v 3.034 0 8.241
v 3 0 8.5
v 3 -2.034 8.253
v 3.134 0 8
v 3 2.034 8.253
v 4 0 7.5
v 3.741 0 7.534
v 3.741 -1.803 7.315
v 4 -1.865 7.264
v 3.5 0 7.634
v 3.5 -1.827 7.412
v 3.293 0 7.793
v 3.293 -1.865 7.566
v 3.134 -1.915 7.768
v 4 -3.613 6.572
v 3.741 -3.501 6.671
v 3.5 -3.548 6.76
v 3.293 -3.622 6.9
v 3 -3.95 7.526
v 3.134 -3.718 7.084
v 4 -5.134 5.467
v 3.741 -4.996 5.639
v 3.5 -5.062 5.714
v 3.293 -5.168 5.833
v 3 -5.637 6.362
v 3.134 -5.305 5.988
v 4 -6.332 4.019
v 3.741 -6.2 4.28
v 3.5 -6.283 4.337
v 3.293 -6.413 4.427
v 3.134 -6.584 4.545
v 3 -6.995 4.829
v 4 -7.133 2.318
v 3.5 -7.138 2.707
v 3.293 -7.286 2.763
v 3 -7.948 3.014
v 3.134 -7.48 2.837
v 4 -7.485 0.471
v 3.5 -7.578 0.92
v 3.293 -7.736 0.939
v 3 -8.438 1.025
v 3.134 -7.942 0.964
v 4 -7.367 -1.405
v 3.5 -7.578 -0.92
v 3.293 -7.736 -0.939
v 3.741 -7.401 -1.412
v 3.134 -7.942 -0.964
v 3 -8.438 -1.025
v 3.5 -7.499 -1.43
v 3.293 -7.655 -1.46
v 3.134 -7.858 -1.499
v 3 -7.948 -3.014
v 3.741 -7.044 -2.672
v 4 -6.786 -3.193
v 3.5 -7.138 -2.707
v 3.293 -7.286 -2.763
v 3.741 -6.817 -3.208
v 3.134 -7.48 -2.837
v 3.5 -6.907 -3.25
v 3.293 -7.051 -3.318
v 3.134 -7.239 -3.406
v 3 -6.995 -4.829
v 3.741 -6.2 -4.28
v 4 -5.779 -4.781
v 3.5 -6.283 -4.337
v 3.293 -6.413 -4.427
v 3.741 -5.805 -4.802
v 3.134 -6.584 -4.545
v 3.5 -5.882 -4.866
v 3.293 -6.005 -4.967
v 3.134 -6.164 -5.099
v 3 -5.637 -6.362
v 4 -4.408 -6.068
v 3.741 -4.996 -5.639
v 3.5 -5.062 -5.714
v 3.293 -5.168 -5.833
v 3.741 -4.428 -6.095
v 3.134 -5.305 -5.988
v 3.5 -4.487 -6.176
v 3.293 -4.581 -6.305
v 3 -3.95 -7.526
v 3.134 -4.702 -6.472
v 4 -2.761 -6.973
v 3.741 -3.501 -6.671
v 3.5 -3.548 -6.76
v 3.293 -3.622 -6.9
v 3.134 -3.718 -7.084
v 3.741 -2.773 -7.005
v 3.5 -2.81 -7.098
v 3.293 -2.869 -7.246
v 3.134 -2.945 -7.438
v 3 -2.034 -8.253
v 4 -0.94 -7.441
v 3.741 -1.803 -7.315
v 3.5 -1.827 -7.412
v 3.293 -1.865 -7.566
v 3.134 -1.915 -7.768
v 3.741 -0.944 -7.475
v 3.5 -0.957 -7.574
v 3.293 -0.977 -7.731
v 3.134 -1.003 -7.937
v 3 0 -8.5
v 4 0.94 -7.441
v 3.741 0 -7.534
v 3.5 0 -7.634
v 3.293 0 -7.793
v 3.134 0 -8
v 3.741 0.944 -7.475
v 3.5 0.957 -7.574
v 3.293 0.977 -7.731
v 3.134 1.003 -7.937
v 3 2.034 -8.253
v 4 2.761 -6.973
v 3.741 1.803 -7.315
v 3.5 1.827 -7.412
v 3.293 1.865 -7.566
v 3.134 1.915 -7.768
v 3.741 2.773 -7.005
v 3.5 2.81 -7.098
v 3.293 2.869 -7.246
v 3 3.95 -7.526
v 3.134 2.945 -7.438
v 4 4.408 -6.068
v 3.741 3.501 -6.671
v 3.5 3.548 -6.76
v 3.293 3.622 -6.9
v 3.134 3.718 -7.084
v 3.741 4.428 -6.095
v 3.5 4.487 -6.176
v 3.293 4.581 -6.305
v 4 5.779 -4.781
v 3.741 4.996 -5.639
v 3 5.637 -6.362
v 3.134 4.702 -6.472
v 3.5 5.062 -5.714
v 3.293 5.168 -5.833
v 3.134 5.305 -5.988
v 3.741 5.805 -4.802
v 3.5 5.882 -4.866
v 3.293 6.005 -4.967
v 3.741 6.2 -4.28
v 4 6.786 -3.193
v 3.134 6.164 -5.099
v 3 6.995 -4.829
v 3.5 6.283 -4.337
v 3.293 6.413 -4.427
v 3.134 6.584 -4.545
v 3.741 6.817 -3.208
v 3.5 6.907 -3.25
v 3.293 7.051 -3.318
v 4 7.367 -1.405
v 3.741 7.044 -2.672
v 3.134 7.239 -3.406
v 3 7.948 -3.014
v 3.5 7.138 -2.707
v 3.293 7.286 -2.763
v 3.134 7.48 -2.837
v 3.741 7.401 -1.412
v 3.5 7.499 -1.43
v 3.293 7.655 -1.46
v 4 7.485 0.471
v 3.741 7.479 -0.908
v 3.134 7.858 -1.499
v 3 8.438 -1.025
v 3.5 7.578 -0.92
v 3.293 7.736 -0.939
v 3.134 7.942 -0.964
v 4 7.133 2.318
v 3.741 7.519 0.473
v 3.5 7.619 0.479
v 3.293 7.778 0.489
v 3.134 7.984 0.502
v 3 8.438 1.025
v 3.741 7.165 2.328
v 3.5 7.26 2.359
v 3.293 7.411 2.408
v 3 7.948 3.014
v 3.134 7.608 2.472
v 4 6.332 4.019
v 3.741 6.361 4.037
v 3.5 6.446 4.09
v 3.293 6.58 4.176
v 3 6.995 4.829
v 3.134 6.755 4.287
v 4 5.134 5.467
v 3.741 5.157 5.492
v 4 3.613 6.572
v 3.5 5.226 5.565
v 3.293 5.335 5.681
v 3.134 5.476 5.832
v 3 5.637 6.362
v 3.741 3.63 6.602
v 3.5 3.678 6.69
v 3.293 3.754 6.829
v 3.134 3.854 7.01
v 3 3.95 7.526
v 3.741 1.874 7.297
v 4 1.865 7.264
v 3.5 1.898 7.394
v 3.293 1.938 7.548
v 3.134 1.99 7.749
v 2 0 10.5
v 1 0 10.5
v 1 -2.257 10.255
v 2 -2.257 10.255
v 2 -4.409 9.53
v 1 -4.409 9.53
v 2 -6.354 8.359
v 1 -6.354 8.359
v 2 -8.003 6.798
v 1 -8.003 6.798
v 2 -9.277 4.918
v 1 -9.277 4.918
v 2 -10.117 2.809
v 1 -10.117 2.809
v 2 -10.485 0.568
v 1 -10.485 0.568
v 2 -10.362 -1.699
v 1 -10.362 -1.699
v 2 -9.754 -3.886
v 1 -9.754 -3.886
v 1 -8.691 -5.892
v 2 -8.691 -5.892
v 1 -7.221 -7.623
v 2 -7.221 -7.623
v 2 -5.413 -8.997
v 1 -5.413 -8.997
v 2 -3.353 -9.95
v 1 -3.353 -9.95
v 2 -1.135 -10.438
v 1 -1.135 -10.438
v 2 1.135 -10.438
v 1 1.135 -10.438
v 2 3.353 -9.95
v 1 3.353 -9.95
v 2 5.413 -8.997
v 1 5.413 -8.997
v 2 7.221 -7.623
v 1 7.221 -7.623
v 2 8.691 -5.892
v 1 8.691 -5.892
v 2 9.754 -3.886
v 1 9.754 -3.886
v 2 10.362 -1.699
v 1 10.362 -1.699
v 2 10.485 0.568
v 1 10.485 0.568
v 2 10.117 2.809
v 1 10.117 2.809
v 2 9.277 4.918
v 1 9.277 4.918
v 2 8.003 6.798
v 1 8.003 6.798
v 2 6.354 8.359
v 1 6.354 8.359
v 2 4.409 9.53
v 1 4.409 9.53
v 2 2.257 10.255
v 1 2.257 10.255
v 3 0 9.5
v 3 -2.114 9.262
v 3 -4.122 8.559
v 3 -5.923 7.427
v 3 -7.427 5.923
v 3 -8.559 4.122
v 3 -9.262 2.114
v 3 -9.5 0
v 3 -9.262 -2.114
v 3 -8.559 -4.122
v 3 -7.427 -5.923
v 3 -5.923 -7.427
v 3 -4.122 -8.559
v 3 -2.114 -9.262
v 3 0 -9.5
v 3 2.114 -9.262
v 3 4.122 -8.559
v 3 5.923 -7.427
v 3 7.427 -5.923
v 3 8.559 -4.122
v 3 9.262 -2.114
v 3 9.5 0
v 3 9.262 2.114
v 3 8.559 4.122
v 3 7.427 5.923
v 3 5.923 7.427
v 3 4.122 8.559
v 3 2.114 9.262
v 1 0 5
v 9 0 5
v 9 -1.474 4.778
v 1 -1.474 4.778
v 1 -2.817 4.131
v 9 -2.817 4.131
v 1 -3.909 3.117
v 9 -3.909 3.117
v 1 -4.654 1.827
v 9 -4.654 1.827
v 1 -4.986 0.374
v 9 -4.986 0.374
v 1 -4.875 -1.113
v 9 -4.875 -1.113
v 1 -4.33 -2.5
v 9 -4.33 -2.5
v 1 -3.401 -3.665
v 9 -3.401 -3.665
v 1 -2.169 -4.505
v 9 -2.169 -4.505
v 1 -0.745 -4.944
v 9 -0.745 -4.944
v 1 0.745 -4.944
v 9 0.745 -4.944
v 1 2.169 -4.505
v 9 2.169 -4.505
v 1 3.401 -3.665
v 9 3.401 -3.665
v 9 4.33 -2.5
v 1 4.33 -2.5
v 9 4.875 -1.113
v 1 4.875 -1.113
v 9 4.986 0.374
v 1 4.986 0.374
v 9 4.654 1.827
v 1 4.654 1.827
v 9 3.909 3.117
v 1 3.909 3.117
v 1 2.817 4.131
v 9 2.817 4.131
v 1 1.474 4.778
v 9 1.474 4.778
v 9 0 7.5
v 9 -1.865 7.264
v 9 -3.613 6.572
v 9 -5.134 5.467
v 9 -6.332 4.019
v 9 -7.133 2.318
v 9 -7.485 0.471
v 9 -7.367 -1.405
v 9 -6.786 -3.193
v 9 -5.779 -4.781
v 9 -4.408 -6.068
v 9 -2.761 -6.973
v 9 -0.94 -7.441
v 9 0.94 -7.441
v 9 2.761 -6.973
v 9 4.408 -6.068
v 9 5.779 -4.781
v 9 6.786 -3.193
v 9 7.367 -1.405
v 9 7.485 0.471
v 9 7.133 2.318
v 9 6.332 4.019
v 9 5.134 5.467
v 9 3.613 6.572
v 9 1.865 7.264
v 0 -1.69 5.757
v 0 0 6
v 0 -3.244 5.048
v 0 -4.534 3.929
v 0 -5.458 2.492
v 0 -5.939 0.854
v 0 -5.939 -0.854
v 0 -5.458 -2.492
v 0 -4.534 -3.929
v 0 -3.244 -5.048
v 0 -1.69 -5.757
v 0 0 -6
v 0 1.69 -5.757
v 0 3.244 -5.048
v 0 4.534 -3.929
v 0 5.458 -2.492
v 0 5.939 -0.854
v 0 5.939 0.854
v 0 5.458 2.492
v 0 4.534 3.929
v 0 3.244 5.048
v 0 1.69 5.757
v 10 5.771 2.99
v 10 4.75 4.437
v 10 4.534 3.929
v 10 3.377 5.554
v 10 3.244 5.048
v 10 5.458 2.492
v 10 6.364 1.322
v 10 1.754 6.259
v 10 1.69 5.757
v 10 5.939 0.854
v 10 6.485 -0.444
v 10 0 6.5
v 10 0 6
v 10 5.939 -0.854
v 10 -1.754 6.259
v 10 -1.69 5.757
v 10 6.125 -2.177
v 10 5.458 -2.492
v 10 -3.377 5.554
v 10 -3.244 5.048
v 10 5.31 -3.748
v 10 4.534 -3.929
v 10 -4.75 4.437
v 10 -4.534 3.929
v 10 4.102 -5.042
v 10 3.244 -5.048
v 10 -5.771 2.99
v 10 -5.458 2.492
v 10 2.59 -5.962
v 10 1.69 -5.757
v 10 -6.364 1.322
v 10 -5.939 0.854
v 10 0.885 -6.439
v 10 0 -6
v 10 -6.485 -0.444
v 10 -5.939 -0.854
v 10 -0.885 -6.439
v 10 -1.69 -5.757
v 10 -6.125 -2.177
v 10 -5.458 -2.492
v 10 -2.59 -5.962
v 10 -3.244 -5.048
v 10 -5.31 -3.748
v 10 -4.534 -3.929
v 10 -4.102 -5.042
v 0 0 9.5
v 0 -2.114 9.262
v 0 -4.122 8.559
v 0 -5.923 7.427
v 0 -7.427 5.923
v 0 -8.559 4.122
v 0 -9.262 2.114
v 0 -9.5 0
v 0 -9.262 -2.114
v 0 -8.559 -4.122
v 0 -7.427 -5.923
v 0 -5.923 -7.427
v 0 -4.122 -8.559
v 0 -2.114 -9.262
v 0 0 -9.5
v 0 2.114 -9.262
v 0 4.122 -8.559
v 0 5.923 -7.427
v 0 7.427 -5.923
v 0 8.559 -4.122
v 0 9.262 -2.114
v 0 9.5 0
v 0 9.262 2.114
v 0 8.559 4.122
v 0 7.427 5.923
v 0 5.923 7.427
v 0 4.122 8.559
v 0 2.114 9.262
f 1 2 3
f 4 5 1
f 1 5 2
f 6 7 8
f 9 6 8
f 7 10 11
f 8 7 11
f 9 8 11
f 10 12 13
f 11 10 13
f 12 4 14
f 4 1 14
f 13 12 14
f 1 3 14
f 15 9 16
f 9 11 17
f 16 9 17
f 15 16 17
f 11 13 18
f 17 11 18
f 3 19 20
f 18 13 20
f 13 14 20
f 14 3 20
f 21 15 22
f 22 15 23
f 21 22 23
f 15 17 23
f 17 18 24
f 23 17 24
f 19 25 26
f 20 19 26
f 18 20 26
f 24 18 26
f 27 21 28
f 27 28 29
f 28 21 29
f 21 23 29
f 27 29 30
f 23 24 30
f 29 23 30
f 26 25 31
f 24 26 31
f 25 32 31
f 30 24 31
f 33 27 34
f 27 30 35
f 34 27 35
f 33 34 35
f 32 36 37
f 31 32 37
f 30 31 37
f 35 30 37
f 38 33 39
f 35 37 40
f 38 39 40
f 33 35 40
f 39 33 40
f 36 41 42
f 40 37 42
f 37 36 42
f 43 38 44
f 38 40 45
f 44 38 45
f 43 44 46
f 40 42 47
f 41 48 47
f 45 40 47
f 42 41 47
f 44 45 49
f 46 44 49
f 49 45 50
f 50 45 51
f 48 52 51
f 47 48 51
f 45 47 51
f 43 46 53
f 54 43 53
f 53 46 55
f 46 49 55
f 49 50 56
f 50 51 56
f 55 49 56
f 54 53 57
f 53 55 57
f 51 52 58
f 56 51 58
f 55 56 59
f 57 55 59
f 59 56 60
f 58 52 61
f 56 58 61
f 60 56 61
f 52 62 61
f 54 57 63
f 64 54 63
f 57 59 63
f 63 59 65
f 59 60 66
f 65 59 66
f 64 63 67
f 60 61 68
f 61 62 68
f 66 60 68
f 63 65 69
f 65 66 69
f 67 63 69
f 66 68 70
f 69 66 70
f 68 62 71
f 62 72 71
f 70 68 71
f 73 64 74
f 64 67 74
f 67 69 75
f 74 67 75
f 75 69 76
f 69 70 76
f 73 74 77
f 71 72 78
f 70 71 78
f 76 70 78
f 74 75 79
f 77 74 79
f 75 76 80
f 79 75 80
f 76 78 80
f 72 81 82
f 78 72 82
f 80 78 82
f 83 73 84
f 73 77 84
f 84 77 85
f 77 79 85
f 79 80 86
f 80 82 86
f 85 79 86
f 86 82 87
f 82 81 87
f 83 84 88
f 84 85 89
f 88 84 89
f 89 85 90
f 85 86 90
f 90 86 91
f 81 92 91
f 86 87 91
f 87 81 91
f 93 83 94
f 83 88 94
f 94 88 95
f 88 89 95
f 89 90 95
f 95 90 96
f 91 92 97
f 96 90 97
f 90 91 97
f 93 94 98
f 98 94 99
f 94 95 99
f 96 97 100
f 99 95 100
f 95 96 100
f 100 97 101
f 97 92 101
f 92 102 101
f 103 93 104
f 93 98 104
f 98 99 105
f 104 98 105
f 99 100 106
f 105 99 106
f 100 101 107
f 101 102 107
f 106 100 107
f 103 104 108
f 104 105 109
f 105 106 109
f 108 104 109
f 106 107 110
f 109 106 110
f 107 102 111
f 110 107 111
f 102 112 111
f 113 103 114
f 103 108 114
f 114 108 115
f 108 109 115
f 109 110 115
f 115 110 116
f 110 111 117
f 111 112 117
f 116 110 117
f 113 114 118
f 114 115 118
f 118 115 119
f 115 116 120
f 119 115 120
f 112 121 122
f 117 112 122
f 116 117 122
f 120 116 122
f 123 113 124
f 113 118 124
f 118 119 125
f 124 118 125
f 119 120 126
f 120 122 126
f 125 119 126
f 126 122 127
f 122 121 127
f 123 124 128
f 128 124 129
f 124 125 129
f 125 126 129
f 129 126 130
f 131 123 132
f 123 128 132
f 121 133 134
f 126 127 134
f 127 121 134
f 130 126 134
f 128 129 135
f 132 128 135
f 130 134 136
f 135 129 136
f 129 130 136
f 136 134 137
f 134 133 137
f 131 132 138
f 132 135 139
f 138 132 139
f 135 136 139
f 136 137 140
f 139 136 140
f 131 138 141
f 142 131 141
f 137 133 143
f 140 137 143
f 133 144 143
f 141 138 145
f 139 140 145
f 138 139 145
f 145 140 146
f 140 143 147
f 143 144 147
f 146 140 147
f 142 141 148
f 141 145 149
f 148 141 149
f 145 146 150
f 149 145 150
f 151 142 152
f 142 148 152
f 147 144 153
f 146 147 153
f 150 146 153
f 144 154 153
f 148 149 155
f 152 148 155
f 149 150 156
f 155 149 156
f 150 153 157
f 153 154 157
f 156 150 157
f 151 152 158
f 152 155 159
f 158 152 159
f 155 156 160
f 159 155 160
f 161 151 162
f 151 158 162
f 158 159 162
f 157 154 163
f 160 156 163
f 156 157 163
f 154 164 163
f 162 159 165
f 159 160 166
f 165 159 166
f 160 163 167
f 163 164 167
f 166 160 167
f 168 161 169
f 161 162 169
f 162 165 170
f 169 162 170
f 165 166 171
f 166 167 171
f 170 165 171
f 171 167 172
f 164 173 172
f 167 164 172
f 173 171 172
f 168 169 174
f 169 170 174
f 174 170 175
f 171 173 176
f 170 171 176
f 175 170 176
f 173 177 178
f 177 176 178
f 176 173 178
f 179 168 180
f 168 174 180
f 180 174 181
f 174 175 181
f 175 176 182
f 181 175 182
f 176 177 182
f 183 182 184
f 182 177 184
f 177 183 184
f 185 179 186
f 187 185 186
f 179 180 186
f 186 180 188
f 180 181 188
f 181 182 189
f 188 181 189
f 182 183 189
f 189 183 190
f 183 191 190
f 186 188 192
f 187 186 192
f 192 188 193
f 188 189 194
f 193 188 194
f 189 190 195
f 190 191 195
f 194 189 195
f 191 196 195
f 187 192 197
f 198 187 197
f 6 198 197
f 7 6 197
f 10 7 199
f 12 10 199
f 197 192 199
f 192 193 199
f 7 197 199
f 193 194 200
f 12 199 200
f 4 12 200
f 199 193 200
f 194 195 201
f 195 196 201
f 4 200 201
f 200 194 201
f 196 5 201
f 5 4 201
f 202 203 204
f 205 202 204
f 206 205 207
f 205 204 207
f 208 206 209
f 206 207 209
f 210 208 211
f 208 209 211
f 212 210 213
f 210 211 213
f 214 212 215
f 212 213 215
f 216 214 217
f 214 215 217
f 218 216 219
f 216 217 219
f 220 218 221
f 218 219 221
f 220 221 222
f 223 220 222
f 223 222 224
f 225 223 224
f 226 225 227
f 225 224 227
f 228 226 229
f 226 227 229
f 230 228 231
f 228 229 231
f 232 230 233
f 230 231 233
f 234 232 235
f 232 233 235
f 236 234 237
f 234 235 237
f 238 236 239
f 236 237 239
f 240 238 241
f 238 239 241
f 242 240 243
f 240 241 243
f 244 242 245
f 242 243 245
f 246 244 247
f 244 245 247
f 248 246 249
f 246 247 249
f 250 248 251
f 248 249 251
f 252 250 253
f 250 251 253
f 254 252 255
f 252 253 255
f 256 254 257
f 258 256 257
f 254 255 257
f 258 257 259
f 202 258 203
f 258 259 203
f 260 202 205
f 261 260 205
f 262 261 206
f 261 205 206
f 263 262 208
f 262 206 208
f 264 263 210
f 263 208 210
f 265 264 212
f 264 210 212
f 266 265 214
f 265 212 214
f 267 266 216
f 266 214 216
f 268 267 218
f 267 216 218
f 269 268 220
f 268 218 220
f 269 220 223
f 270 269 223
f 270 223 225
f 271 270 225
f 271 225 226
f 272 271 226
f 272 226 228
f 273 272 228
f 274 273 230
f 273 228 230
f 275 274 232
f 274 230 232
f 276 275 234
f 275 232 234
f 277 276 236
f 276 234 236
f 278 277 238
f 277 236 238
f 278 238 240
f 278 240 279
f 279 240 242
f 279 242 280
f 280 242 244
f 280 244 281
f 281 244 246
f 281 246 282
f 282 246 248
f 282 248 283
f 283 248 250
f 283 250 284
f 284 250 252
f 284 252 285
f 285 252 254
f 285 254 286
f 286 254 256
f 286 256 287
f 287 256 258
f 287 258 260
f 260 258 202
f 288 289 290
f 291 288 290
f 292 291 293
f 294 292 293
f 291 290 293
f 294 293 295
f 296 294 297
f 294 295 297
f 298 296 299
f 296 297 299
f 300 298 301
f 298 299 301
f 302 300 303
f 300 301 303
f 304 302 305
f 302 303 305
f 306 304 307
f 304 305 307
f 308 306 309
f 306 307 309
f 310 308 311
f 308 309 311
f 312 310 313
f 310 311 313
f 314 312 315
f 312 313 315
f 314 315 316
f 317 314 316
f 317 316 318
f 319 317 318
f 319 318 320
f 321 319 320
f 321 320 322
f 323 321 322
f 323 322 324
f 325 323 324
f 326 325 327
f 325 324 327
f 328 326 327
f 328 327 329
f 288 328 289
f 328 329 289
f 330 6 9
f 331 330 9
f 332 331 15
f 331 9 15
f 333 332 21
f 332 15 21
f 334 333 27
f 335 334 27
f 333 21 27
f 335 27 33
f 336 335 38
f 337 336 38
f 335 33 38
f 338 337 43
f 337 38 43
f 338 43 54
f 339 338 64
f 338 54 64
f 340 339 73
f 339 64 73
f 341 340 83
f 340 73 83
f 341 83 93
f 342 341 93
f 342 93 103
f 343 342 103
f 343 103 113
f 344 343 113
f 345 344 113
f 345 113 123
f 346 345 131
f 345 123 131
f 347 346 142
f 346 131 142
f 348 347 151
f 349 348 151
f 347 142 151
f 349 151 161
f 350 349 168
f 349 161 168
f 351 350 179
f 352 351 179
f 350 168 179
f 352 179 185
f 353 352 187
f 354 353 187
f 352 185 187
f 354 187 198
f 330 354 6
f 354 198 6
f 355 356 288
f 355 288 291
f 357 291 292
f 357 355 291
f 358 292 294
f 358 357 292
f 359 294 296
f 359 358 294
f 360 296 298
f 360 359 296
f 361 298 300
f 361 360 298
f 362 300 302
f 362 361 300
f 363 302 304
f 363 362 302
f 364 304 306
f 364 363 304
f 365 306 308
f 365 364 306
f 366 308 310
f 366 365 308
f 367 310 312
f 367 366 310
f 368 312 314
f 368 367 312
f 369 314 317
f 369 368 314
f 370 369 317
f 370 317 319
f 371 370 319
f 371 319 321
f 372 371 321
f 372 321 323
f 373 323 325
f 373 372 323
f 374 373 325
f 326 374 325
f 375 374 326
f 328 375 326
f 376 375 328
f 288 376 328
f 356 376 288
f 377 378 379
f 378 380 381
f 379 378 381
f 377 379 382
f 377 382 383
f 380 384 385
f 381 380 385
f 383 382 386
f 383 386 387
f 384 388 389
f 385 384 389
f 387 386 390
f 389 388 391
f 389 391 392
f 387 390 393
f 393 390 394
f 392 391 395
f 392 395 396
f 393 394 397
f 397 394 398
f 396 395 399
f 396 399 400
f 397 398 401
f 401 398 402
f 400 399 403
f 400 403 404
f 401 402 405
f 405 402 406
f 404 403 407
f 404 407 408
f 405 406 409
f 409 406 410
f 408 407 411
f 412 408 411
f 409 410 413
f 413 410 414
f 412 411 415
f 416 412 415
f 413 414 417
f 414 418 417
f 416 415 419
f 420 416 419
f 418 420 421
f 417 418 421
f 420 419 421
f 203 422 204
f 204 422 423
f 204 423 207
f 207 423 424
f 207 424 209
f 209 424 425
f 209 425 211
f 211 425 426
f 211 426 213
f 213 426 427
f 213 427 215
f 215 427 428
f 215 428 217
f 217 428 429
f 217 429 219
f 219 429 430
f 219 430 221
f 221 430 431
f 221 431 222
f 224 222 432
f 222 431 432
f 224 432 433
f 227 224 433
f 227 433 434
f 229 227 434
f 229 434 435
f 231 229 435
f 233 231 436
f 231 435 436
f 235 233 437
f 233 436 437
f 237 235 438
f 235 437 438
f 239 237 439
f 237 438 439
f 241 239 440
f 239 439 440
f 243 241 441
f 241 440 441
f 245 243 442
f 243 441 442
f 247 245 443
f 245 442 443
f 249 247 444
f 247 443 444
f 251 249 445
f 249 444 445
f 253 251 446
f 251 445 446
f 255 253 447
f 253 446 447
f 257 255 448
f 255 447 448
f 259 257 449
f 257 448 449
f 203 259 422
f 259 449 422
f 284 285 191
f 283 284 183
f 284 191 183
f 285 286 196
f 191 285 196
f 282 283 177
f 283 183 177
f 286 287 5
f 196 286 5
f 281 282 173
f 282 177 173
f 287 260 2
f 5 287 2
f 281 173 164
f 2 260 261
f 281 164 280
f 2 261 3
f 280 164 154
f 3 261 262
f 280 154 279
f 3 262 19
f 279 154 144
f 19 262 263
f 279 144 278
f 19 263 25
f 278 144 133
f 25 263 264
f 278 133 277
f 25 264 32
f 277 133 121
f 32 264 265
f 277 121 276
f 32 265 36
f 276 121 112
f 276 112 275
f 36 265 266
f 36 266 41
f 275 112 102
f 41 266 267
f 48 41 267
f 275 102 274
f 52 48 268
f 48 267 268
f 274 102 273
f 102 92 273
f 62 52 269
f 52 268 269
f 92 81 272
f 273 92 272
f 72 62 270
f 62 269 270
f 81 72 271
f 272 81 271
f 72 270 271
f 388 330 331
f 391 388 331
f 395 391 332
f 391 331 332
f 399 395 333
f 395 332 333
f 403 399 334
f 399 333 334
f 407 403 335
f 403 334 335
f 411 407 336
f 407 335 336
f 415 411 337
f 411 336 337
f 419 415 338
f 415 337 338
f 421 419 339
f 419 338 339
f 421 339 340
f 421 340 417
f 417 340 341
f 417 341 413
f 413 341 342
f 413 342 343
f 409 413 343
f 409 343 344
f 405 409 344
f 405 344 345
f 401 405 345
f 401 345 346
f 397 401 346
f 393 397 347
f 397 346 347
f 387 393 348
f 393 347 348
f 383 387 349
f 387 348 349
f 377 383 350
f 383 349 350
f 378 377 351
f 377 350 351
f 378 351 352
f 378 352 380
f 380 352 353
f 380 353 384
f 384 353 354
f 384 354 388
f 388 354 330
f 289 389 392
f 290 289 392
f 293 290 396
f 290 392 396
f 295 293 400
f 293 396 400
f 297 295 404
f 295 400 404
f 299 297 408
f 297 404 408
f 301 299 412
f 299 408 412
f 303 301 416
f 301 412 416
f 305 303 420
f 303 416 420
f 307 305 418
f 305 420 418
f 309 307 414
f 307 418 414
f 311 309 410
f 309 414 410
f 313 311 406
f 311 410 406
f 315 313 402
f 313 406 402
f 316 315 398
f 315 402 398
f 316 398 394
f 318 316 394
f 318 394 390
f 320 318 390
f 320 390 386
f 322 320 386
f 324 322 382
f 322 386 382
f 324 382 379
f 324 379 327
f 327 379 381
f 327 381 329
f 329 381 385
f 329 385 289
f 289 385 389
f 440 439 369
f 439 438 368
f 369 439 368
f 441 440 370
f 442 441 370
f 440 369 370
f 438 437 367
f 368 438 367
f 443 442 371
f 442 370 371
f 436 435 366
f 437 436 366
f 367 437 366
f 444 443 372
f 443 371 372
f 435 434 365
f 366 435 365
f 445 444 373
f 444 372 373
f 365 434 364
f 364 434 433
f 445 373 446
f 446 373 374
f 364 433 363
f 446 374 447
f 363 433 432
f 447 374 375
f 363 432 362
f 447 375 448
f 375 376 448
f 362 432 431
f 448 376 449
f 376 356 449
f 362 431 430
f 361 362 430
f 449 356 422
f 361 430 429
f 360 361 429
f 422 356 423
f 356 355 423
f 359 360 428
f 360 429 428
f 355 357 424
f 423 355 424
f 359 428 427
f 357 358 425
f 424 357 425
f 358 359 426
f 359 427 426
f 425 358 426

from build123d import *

# Parameters (mm, degrees)
CHAMFER1_SIZE = 1
FILLET1_R     = 1


with BuildPart() as part:
    # Sketch1 → Revolve1 (revolve)
    with BuildSketch(Plane.XY, mode=Mode.PRIVATE) as revolve1_sk:
        Polygon((0, 5), (10, 5), (10, 7.5), (3, 7.5), (3, 10.5), (0, 10.5), align=None)
    revolve(revolve1_sk.sketch.rotate(Axis((0, 0, 0), (1, 0, 0)), 90), axis=Axis((0, 0, 0), (1, 0, 0)))

    # Chamfer1
    chamfer1_edges = [part.edges().sort_by_distance(p)[0] for p in [
        (0, 0, -10.5),
        (3, 0, -10.5),
        (10, 0, -7.5),
        (10, 0, -5),
        (0, 0, -5),
    ]]
    chamfer(chamfer1_edges, length=CHAMFER1_SIZE)

    # Fillet1
    fillet1_edges = [part.edges().sort_by_distance(p)[0] for p in [
        (3, 0, -7.5),
    ]]
    fillet(fillet1_edges, radius=FILLET1_R)


solid = part.part
